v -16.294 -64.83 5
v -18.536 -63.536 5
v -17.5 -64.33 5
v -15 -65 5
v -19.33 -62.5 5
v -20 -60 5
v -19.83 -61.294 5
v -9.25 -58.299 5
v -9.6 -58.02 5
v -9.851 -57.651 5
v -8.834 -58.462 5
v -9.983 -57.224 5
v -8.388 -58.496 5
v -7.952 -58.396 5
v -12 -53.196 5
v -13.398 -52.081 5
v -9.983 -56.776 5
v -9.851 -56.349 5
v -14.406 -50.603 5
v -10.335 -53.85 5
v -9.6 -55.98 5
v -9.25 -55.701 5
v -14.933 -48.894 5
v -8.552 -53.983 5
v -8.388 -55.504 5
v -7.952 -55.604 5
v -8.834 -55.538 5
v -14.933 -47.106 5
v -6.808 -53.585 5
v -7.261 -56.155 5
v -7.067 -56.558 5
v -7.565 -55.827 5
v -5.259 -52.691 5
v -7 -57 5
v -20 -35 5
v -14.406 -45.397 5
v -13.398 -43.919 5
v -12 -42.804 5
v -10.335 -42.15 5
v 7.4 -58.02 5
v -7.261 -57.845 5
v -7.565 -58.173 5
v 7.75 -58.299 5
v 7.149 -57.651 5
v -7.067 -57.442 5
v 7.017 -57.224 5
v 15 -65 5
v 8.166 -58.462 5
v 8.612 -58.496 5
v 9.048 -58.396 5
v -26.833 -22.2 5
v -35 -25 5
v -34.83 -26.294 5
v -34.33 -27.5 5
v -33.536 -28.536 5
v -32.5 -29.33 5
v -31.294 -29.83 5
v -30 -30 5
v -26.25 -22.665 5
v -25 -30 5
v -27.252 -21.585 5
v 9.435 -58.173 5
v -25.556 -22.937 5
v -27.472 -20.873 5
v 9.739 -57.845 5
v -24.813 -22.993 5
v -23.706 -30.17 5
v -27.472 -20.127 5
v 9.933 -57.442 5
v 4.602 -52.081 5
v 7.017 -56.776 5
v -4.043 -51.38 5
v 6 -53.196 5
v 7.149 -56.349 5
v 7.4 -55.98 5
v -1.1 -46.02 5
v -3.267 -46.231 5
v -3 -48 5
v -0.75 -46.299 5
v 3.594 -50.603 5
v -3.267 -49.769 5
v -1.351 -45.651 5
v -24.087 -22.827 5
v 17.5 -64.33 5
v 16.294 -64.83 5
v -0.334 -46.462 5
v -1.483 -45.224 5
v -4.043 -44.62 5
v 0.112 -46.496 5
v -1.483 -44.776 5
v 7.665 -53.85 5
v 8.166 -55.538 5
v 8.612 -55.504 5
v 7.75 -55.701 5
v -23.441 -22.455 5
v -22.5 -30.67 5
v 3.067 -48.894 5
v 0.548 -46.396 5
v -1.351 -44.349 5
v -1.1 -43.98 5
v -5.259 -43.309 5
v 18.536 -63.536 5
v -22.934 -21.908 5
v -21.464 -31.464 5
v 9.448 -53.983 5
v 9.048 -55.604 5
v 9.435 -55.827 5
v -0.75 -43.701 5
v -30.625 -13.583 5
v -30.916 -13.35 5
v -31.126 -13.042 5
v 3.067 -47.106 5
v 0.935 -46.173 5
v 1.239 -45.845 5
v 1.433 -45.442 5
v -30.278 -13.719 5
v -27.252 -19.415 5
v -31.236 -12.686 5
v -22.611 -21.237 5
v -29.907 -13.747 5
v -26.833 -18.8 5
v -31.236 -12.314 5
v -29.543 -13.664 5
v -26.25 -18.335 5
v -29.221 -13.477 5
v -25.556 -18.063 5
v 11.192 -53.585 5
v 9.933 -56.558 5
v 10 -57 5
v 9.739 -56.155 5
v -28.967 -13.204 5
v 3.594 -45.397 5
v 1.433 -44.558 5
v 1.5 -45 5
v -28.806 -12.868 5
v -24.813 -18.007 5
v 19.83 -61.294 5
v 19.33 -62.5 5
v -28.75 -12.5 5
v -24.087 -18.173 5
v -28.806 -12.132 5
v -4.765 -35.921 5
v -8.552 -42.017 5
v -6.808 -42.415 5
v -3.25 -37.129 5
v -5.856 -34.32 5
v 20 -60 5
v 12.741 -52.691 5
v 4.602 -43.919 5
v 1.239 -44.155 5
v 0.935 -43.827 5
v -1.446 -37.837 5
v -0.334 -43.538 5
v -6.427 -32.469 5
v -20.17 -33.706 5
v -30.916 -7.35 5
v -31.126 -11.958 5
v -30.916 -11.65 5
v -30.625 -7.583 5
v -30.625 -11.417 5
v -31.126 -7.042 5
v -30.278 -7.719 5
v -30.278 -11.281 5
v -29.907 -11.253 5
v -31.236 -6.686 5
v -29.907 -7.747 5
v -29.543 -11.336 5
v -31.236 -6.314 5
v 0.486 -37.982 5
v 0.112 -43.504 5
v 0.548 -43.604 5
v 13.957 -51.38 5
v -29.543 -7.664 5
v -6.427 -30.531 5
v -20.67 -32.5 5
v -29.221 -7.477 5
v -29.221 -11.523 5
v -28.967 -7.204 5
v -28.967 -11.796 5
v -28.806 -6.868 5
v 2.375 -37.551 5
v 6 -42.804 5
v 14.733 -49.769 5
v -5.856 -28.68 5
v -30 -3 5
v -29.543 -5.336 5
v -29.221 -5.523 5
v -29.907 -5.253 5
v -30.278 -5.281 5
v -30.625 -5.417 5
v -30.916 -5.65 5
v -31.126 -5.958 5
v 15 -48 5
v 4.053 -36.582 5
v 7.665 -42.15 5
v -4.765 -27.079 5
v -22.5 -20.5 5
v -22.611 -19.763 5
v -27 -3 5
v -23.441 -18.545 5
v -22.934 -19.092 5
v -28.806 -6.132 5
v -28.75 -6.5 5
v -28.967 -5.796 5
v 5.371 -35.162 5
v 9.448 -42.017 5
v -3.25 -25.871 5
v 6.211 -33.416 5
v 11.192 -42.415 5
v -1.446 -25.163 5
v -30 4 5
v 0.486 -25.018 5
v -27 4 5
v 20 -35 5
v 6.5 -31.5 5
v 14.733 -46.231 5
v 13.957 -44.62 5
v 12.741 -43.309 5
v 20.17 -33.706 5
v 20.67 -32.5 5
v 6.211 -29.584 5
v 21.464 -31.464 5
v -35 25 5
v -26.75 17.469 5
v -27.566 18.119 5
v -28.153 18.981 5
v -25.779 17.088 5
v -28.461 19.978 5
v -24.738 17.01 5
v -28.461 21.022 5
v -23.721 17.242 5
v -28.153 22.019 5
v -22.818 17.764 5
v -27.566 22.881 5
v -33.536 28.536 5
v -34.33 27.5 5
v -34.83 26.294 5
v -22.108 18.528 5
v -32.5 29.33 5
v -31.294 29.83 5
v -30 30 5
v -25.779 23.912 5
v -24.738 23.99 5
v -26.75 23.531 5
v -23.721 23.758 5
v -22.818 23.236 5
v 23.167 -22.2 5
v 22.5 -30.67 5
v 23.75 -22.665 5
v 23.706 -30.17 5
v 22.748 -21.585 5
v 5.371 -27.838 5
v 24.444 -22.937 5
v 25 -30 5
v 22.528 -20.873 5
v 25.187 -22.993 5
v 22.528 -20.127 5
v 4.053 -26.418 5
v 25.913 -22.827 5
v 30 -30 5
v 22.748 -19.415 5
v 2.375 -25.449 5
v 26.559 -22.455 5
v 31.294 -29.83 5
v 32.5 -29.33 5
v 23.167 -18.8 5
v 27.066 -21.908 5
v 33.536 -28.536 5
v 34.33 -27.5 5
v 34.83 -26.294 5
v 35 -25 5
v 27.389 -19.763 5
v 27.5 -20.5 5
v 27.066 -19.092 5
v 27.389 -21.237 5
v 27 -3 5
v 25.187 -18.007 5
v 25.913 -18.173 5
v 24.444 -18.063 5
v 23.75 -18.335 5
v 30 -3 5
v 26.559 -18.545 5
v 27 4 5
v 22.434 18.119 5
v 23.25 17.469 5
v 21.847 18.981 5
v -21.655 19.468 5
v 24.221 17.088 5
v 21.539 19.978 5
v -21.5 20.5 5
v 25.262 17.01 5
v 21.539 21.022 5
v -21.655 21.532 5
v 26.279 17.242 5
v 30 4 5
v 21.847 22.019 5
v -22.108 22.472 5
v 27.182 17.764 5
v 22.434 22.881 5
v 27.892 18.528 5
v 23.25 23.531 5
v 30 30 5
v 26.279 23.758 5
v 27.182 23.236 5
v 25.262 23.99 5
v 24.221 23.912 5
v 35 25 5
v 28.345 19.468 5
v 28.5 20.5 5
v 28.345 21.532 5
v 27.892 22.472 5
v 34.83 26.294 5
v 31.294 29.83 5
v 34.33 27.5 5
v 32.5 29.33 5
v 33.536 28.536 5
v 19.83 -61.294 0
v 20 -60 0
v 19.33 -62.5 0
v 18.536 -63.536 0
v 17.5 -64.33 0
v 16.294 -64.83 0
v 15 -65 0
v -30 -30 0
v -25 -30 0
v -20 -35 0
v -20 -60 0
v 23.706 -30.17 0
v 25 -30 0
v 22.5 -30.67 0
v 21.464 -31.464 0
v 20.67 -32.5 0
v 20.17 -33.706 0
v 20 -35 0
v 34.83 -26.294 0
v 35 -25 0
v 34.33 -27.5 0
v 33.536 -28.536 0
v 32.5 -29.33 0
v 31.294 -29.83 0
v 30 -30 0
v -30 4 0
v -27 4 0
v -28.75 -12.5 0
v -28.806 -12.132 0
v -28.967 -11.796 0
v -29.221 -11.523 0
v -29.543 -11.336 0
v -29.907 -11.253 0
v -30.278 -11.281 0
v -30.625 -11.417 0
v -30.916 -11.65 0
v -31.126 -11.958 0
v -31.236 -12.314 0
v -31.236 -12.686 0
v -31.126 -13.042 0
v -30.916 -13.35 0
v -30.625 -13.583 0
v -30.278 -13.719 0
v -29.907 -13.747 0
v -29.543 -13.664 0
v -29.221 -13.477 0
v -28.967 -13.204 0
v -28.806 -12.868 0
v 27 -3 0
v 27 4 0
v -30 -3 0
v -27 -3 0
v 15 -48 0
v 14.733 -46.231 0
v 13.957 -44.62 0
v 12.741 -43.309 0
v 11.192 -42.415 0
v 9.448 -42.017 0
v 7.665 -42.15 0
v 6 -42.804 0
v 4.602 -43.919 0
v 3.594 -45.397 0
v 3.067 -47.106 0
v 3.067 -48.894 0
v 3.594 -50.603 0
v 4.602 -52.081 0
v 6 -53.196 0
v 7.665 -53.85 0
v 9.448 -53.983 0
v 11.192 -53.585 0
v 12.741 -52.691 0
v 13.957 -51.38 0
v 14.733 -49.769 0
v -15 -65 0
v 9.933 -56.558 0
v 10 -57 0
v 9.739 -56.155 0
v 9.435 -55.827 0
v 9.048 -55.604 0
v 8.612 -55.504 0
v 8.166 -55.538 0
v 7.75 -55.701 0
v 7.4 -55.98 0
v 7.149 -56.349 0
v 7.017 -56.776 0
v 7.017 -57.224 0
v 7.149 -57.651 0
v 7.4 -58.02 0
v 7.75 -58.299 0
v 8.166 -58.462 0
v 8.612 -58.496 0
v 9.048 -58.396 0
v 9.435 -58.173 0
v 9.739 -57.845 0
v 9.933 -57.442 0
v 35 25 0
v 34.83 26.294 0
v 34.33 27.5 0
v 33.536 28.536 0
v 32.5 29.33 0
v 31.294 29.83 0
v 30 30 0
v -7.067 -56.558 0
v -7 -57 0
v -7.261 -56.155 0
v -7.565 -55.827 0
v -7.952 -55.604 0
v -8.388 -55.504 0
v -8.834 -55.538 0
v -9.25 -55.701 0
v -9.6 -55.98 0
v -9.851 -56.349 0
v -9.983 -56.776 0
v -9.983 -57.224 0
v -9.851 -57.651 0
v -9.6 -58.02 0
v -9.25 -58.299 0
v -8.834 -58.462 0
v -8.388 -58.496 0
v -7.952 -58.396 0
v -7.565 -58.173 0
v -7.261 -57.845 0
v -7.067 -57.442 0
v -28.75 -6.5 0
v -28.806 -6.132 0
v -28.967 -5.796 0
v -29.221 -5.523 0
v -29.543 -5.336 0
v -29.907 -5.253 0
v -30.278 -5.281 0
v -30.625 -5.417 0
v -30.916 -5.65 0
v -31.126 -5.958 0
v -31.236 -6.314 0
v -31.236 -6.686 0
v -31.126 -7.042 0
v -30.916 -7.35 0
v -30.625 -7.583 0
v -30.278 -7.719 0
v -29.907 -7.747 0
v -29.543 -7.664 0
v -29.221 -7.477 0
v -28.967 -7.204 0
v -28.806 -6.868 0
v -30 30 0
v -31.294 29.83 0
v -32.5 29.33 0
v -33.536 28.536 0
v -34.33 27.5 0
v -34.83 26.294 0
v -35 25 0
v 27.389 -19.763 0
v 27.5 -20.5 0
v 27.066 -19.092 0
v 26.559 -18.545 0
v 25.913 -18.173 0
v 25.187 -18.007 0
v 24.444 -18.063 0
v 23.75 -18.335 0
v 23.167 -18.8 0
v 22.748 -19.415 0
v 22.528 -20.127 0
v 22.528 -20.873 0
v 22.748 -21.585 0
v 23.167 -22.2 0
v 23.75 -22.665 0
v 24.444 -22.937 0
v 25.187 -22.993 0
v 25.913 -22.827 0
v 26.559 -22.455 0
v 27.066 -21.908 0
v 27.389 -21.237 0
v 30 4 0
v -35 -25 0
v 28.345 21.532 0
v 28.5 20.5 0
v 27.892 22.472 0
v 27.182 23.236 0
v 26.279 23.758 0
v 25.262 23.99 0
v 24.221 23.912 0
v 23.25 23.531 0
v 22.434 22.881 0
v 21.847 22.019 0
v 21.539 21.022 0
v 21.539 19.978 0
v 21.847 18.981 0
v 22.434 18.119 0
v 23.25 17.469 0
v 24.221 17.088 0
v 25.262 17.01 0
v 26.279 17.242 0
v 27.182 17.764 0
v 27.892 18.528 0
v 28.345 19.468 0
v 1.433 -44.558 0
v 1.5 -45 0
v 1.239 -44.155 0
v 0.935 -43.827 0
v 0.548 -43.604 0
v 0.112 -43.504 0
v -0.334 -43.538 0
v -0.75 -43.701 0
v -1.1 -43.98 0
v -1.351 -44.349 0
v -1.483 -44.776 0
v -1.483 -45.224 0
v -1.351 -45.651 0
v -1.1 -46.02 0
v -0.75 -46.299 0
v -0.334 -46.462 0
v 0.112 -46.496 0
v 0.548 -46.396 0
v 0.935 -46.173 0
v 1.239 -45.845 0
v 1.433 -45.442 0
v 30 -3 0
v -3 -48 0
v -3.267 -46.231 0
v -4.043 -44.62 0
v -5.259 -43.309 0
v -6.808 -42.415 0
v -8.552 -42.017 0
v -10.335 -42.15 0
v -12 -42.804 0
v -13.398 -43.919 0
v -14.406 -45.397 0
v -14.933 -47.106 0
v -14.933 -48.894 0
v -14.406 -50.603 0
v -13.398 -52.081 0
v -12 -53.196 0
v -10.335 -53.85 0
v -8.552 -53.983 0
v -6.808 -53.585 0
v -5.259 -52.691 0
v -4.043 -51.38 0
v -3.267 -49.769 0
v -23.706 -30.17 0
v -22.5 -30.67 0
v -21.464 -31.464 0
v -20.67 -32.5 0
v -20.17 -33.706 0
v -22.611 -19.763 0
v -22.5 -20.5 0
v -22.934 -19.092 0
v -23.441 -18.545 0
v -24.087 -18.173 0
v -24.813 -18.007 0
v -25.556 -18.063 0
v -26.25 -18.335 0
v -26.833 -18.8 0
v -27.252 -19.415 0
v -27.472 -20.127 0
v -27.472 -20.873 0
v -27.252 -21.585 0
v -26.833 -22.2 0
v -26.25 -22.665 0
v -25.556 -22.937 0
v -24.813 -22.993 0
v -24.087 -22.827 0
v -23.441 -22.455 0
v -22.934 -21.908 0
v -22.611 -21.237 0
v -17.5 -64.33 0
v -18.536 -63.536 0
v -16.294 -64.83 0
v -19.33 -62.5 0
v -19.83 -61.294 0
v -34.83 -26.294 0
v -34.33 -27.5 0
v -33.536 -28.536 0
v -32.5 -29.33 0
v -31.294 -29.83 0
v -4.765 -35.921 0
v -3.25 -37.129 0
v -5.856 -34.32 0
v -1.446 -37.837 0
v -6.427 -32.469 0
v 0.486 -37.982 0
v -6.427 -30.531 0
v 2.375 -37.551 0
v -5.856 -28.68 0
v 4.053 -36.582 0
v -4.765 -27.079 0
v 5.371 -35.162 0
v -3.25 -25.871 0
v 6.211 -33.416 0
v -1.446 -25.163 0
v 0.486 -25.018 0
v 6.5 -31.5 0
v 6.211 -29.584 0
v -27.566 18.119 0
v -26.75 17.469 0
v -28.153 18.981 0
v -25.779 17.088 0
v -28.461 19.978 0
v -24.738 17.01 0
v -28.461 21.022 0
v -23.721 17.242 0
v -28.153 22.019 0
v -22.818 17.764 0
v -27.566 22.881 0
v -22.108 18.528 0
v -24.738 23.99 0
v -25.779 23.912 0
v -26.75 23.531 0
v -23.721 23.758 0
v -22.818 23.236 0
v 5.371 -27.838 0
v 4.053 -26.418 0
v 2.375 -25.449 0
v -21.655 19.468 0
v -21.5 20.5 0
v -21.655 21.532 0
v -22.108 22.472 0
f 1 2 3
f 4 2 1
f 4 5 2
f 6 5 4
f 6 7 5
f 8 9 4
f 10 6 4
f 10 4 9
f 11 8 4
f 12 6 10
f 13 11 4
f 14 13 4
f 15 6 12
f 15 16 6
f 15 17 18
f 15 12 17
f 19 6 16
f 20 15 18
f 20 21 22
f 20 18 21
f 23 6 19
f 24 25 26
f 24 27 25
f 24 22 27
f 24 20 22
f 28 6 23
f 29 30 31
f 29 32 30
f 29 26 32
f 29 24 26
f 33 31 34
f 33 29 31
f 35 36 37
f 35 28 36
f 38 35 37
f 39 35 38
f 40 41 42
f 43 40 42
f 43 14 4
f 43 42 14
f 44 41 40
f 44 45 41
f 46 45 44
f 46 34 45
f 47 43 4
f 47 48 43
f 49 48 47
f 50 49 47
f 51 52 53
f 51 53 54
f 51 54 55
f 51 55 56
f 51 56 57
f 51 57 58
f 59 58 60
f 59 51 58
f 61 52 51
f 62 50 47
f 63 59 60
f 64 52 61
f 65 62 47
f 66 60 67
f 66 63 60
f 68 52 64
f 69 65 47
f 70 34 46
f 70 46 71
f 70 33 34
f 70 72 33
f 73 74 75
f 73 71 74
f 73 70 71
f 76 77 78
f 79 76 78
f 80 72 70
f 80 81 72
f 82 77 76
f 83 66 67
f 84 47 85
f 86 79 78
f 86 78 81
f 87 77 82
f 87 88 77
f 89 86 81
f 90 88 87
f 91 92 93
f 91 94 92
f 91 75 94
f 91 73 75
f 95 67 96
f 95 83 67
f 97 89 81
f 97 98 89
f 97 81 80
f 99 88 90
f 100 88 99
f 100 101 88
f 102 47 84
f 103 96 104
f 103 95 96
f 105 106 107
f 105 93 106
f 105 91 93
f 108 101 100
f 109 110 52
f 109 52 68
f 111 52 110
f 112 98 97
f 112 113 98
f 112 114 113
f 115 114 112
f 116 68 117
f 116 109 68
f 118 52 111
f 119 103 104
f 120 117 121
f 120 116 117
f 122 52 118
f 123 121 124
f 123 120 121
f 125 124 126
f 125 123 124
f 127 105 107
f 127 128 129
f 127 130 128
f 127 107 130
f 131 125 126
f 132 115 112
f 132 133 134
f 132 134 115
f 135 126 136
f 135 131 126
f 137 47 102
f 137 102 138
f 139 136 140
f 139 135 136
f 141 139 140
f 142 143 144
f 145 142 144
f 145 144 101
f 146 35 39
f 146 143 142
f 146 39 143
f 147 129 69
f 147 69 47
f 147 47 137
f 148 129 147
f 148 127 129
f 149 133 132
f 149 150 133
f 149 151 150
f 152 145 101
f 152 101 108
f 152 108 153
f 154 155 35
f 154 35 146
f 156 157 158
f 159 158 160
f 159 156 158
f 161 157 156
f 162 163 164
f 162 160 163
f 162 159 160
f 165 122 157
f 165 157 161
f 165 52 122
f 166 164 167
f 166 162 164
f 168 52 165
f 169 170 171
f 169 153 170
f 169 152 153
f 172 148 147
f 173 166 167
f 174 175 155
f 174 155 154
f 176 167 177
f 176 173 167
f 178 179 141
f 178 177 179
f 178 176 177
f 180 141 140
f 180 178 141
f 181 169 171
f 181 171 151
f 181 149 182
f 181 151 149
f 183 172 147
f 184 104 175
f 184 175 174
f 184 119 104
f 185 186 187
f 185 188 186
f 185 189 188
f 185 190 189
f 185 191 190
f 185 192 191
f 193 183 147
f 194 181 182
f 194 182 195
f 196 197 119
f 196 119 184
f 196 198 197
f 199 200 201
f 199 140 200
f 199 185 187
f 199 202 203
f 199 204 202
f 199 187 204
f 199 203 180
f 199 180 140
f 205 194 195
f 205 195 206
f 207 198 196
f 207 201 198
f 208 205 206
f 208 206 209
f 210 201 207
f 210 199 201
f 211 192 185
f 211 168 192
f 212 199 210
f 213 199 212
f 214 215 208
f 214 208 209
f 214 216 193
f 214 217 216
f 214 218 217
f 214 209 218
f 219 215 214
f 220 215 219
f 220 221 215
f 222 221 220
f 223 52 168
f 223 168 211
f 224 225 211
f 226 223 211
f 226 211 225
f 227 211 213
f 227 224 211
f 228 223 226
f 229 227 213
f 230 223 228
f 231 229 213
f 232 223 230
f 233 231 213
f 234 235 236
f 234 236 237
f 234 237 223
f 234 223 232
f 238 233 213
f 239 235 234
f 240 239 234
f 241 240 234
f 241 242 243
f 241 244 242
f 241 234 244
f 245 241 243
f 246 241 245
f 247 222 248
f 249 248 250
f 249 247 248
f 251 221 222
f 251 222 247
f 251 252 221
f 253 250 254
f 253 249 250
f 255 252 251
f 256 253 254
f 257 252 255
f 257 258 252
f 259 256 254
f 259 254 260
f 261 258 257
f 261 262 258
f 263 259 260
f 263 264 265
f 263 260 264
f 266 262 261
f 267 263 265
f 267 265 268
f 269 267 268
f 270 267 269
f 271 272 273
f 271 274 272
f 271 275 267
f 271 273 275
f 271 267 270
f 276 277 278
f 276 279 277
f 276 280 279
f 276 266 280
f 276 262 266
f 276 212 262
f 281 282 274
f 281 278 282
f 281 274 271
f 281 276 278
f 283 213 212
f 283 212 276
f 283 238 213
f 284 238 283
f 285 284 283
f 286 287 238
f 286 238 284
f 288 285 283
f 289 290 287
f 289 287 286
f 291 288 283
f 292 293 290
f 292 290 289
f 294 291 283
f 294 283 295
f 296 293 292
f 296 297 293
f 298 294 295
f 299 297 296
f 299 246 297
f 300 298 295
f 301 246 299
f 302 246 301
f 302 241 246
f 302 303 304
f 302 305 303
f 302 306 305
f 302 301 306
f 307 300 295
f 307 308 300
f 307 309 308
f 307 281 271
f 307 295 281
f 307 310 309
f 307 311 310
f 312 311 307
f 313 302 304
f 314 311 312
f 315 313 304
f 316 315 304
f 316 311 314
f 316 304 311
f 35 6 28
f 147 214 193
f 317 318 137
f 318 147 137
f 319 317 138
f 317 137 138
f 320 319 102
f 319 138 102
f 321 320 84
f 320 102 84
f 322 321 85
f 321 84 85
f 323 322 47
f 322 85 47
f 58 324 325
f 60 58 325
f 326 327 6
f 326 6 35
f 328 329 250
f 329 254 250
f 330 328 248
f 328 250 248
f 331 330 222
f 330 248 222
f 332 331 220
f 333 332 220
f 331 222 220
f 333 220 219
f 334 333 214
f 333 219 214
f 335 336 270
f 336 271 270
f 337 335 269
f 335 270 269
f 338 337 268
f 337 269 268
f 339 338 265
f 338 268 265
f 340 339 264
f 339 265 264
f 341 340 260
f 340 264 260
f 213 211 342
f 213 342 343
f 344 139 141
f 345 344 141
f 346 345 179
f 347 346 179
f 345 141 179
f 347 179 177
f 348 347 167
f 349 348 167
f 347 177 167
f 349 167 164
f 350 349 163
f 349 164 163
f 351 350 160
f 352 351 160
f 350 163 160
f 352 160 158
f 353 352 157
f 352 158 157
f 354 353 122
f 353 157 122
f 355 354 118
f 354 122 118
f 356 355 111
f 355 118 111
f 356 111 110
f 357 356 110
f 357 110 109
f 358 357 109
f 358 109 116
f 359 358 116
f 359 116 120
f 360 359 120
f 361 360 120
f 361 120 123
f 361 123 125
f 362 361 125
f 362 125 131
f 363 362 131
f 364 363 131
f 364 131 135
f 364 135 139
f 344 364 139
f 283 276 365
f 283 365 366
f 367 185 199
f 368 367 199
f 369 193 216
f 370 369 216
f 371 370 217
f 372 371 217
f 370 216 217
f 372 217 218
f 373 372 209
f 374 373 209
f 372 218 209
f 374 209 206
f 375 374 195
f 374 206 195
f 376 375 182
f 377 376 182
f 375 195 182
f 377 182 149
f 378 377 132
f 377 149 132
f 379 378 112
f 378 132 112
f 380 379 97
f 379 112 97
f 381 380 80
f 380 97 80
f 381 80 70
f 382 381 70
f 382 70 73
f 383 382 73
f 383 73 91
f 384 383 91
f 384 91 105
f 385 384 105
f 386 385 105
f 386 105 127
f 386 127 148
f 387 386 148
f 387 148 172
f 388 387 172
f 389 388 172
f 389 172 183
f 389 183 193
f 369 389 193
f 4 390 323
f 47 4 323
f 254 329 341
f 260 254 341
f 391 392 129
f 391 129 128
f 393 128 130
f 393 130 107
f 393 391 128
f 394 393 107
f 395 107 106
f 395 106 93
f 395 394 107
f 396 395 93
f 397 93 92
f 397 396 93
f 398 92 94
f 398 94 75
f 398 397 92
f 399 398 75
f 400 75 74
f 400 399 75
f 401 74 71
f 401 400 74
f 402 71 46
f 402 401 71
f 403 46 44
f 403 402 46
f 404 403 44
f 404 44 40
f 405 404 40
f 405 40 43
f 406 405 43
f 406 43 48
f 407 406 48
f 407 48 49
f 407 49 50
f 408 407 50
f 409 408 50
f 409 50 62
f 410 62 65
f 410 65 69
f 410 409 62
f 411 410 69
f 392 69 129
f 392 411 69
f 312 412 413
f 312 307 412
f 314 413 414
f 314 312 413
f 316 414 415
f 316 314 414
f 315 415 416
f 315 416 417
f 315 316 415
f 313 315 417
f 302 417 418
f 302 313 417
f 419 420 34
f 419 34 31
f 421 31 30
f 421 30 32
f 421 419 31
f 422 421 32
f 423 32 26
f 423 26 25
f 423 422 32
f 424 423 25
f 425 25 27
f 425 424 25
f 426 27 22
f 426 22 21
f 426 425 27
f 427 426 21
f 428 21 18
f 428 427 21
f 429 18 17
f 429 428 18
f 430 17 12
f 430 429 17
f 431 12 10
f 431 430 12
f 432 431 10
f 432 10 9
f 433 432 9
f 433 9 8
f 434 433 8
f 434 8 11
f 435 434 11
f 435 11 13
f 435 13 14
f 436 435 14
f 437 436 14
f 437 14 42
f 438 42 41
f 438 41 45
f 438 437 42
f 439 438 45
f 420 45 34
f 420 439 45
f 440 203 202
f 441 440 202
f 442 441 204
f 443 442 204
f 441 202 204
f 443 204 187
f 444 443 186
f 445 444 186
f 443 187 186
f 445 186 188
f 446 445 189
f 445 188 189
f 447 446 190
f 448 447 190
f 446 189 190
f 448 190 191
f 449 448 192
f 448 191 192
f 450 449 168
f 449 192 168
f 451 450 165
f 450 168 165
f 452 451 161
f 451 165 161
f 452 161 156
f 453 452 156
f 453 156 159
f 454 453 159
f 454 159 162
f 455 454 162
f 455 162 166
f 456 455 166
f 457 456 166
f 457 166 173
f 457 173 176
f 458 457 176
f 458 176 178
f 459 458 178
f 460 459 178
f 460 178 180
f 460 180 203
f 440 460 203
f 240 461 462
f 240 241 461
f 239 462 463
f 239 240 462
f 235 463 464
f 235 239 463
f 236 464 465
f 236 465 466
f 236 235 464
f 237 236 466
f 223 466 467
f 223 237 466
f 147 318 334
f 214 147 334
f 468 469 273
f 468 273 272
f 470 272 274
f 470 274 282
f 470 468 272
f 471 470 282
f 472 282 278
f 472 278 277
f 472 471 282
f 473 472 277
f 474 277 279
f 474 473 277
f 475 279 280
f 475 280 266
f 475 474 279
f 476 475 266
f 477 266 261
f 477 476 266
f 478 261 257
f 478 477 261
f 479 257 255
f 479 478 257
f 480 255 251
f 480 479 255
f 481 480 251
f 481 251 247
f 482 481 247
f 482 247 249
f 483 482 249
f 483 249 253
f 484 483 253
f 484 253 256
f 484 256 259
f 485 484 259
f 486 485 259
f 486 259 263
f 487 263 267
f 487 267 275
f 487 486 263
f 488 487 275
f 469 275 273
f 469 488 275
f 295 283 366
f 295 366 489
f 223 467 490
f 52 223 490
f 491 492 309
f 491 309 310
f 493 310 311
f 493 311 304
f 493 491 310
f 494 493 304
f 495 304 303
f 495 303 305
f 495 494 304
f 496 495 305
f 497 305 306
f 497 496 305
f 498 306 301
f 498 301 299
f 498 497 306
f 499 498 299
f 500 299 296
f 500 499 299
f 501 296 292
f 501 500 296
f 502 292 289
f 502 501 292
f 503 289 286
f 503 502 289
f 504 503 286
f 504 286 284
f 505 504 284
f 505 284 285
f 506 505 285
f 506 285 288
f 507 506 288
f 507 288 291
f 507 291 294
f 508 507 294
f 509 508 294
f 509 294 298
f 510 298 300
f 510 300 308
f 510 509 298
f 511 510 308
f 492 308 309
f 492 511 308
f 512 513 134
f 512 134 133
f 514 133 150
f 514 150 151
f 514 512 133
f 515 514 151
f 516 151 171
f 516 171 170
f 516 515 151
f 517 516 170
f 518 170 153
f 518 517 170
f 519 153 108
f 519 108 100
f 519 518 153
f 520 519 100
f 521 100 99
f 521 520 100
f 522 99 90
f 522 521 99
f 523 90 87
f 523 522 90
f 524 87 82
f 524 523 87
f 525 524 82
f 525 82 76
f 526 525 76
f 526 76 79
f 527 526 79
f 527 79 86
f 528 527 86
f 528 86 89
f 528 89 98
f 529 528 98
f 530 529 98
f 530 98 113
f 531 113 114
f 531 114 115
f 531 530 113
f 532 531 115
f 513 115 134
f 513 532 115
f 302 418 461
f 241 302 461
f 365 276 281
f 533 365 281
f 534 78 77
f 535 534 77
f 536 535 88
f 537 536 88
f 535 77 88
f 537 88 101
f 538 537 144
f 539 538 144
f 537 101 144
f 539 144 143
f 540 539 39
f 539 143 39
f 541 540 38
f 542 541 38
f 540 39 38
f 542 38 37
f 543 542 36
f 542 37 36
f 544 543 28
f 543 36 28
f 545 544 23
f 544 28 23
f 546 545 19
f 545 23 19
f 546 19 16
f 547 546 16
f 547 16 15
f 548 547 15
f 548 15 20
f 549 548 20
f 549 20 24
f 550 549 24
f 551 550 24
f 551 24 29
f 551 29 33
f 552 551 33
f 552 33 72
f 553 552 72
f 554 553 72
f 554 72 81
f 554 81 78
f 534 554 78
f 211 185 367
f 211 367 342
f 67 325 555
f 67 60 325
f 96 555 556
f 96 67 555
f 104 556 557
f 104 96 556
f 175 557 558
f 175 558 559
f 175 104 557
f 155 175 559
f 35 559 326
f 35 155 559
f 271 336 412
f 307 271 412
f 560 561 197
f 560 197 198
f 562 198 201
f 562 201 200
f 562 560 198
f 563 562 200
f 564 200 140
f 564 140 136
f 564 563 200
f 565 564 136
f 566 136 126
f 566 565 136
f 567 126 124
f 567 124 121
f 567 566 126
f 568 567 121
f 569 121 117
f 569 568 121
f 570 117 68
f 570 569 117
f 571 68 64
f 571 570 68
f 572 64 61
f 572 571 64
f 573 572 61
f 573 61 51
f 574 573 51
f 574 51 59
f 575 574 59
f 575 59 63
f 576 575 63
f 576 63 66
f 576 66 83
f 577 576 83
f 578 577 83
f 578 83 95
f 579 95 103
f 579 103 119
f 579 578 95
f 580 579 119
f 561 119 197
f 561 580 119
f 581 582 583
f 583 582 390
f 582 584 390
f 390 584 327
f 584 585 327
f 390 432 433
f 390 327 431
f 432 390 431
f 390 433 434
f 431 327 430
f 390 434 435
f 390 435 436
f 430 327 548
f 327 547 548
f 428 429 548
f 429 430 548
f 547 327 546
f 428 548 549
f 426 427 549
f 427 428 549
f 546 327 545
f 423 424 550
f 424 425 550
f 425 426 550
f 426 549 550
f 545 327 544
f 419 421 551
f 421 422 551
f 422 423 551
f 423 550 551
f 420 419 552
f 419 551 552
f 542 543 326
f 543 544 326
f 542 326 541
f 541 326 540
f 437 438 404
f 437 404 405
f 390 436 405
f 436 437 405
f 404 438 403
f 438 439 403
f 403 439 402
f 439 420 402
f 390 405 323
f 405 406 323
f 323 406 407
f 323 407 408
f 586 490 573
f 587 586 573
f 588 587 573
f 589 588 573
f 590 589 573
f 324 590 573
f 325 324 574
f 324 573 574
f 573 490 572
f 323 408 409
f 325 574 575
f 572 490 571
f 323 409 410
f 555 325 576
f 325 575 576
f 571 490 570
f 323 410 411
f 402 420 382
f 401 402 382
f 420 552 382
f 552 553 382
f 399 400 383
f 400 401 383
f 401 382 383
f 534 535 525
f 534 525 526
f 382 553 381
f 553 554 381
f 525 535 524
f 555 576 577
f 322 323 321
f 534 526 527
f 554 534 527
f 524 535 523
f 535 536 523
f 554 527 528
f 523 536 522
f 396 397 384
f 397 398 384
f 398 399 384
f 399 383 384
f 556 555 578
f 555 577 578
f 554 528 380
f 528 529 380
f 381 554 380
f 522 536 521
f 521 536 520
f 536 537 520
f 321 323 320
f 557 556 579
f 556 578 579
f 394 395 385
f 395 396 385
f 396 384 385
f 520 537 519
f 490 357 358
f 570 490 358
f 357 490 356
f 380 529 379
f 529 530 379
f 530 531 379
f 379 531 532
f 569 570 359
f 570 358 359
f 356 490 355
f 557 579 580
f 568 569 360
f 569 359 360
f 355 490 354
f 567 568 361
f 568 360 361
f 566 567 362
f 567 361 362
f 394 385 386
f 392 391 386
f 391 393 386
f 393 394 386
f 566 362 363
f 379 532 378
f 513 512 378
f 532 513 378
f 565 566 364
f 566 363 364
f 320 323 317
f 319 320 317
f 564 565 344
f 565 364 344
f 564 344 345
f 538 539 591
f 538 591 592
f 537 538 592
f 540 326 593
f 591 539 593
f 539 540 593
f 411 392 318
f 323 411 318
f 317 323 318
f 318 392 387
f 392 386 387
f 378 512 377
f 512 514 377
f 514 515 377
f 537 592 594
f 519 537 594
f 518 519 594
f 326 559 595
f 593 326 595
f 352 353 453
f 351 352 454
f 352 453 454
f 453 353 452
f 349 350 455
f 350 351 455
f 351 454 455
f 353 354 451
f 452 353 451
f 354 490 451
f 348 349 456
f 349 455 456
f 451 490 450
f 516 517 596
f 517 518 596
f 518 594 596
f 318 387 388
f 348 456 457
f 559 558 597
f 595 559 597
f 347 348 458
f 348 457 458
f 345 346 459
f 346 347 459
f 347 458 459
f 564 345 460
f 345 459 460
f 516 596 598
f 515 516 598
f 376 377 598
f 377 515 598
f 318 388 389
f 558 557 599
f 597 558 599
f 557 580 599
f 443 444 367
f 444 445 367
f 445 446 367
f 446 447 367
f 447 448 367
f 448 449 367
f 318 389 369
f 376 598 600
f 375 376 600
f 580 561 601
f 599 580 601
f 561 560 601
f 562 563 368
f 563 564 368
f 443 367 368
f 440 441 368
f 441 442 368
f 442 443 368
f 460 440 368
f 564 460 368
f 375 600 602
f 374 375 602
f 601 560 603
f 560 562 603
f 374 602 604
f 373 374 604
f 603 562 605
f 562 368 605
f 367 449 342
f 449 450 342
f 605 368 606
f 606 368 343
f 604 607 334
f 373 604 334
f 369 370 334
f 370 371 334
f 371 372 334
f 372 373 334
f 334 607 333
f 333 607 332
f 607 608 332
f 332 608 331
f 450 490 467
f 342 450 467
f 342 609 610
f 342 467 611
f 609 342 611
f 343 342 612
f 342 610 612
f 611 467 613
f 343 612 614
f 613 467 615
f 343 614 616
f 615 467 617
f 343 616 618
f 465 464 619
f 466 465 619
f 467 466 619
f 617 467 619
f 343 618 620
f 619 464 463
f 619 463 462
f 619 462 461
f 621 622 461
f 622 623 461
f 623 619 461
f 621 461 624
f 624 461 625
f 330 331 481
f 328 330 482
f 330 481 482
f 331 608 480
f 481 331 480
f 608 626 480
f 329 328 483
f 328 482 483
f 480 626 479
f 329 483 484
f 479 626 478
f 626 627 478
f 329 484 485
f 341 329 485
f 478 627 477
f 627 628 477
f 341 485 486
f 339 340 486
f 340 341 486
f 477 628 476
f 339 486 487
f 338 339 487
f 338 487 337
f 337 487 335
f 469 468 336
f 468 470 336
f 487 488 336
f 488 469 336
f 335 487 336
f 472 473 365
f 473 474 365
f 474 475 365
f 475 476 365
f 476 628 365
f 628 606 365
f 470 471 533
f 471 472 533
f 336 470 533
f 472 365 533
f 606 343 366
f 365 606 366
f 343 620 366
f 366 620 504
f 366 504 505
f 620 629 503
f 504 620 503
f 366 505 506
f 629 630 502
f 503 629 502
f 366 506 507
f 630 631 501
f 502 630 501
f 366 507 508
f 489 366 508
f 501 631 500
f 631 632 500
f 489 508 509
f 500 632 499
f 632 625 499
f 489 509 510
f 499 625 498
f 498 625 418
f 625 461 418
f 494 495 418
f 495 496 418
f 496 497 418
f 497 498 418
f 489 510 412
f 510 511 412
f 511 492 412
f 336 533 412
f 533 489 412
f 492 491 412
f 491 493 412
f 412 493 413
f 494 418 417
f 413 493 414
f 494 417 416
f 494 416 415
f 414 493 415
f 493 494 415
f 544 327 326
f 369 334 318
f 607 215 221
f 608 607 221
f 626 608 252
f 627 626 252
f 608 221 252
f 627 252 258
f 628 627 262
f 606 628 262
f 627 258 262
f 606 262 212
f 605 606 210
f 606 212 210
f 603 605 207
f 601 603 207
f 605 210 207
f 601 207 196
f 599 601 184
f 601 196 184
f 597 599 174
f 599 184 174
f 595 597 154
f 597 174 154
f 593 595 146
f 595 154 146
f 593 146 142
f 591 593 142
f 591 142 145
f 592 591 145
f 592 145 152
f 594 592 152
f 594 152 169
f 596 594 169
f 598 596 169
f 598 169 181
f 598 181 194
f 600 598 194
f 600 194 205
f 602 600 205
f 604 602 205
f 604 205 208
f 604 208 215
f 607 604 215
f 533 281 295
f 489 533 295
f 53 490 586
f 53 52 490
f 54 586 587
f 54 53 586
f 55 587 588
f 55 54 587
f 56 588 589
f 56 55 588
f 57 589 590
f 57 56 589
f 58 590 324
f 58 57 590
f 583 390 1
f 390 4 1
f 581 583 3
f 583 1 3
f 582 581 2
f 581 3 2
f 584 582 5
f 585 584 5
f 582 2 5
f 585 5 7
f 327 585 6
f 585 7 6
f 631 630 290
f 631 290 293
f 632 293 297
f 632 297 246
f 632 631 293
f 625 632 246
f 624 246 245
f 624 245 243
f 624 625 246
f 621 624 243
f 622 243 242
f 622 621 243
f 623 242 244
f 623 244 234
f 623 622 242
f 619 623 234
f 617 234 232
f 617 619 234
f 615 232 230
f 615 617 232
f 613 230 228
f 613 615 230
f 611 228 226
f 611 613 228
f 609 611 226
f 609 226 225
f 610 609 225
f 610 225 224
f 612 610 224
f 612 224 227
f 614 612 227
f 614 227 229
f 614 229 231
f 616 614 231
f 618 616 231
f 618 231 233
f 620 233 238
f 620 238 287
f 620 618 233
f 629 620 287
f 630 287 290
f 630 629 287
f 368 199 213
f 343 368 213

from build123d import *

# Parameters (mm, degrees)
F0_R     = 2.5
F0_R_2   = 3.5
F0_W     = 40
F0_H     = 35
F0_R_3   = 1.5
F1_DEPTH = 5
F2_R     = 6
F2_R_2   = 6.5
F3_DEPTH = 5.001
F4_W     = 3
F4_H     = 7
F5_DEPTH = 5.001
F6_R     = 1.25
F7_DEPTH = 5.001
F8_R     = 5


with BuildPart() as f1:
    # F0 (on Top) → F1 (new body)
    with BuildSketch(Plane.XY):
        Polygon((35, -30), (35, 30), (-35, 30), (-35, -30), (-20, -30), (20, -30), align=None)
        with Locations((-25, -20.5)):
            Circle(F0_R, mode=Mode.SUBTRACT)
        with Locations((25, -20.5)):
            Circle(F0_R, mode=Mode.SUBTRACT)
        with Locations((-25, 20.5)):
            Circle(F0_R_2, mode=Mode.SUBTRACT)
        with Locations((25, 20.5)):
            Circle(F0_R_2, mode=Mode.SUBTRACT)
        with Locations((0, -47.5)):
            Rectangle(F0_W, F0_H)
        with Locations((-8.5, -57)):
            Circle(F0_R_3, mode=Mode.SUBTRACT)
        with Locations((8.5, -57)):
            Circle(F0_R_3, mode=Mode.SUBTRACT)
        with Locations((0, -45)):
            Circle(F0_R_3, mode=Mode.SUBTRACT)
    extrude(amount=F1_DEPTH)

    # F2 (on face) → F3 (cut, through all)
    with BuildSketch(Plane.XY.offset(5)):
        with Locations((-9, -48)):
            Circle(F2_R)
        with Locations((9, -48)):
            Circle(F2_R)
        with Locations((0, -31.5)):
            Circle(F2_R_2)
    extrude(amount=-F3_DEPTH, mode=Mode.SUBTRACT)

    # F4 (on face) → F5 (cut, through all)
    with BuildSketch(Plane.XY.offset(5)):
        with Locations((28.5, 0.5)):
            Rectangle(F4_W, F4_H)
        with Locations((-28.5, 0.5)):
            Rectangle(F4_W, F4_H)
    extrude(amount=-F5_DEPTH, mode=Mode.SUBTRACT)

    # F6 (on face) → F7 (cut, through all)
    with BuildSketch(Plane.XY.offset(5)):
        with Locations((-30, -6.5)):
            Circle(F6_R)
        with Locations((-30, -12.5)):
            Circle(F6_R)
    extrude(amount=-F7_DEPTH, mode=Mode.SUBTRACT)

    # F8
    f8_edges = [f1.edges().sort_by_distance(p)[0] for p in [
        (-20, -30, 2.5),
        (-20, -65, 2.5),
        (20, -65, 2.5),
        (20, -30, 2.5),
        (35, -30, 2.5),
        (35, 30, 2.5),
        (-35, 30, 2.5),
        (-35, -30, 2.5),
    ]]
    fillet(f8_edges, radius=F8_R)


solid = f1.part
